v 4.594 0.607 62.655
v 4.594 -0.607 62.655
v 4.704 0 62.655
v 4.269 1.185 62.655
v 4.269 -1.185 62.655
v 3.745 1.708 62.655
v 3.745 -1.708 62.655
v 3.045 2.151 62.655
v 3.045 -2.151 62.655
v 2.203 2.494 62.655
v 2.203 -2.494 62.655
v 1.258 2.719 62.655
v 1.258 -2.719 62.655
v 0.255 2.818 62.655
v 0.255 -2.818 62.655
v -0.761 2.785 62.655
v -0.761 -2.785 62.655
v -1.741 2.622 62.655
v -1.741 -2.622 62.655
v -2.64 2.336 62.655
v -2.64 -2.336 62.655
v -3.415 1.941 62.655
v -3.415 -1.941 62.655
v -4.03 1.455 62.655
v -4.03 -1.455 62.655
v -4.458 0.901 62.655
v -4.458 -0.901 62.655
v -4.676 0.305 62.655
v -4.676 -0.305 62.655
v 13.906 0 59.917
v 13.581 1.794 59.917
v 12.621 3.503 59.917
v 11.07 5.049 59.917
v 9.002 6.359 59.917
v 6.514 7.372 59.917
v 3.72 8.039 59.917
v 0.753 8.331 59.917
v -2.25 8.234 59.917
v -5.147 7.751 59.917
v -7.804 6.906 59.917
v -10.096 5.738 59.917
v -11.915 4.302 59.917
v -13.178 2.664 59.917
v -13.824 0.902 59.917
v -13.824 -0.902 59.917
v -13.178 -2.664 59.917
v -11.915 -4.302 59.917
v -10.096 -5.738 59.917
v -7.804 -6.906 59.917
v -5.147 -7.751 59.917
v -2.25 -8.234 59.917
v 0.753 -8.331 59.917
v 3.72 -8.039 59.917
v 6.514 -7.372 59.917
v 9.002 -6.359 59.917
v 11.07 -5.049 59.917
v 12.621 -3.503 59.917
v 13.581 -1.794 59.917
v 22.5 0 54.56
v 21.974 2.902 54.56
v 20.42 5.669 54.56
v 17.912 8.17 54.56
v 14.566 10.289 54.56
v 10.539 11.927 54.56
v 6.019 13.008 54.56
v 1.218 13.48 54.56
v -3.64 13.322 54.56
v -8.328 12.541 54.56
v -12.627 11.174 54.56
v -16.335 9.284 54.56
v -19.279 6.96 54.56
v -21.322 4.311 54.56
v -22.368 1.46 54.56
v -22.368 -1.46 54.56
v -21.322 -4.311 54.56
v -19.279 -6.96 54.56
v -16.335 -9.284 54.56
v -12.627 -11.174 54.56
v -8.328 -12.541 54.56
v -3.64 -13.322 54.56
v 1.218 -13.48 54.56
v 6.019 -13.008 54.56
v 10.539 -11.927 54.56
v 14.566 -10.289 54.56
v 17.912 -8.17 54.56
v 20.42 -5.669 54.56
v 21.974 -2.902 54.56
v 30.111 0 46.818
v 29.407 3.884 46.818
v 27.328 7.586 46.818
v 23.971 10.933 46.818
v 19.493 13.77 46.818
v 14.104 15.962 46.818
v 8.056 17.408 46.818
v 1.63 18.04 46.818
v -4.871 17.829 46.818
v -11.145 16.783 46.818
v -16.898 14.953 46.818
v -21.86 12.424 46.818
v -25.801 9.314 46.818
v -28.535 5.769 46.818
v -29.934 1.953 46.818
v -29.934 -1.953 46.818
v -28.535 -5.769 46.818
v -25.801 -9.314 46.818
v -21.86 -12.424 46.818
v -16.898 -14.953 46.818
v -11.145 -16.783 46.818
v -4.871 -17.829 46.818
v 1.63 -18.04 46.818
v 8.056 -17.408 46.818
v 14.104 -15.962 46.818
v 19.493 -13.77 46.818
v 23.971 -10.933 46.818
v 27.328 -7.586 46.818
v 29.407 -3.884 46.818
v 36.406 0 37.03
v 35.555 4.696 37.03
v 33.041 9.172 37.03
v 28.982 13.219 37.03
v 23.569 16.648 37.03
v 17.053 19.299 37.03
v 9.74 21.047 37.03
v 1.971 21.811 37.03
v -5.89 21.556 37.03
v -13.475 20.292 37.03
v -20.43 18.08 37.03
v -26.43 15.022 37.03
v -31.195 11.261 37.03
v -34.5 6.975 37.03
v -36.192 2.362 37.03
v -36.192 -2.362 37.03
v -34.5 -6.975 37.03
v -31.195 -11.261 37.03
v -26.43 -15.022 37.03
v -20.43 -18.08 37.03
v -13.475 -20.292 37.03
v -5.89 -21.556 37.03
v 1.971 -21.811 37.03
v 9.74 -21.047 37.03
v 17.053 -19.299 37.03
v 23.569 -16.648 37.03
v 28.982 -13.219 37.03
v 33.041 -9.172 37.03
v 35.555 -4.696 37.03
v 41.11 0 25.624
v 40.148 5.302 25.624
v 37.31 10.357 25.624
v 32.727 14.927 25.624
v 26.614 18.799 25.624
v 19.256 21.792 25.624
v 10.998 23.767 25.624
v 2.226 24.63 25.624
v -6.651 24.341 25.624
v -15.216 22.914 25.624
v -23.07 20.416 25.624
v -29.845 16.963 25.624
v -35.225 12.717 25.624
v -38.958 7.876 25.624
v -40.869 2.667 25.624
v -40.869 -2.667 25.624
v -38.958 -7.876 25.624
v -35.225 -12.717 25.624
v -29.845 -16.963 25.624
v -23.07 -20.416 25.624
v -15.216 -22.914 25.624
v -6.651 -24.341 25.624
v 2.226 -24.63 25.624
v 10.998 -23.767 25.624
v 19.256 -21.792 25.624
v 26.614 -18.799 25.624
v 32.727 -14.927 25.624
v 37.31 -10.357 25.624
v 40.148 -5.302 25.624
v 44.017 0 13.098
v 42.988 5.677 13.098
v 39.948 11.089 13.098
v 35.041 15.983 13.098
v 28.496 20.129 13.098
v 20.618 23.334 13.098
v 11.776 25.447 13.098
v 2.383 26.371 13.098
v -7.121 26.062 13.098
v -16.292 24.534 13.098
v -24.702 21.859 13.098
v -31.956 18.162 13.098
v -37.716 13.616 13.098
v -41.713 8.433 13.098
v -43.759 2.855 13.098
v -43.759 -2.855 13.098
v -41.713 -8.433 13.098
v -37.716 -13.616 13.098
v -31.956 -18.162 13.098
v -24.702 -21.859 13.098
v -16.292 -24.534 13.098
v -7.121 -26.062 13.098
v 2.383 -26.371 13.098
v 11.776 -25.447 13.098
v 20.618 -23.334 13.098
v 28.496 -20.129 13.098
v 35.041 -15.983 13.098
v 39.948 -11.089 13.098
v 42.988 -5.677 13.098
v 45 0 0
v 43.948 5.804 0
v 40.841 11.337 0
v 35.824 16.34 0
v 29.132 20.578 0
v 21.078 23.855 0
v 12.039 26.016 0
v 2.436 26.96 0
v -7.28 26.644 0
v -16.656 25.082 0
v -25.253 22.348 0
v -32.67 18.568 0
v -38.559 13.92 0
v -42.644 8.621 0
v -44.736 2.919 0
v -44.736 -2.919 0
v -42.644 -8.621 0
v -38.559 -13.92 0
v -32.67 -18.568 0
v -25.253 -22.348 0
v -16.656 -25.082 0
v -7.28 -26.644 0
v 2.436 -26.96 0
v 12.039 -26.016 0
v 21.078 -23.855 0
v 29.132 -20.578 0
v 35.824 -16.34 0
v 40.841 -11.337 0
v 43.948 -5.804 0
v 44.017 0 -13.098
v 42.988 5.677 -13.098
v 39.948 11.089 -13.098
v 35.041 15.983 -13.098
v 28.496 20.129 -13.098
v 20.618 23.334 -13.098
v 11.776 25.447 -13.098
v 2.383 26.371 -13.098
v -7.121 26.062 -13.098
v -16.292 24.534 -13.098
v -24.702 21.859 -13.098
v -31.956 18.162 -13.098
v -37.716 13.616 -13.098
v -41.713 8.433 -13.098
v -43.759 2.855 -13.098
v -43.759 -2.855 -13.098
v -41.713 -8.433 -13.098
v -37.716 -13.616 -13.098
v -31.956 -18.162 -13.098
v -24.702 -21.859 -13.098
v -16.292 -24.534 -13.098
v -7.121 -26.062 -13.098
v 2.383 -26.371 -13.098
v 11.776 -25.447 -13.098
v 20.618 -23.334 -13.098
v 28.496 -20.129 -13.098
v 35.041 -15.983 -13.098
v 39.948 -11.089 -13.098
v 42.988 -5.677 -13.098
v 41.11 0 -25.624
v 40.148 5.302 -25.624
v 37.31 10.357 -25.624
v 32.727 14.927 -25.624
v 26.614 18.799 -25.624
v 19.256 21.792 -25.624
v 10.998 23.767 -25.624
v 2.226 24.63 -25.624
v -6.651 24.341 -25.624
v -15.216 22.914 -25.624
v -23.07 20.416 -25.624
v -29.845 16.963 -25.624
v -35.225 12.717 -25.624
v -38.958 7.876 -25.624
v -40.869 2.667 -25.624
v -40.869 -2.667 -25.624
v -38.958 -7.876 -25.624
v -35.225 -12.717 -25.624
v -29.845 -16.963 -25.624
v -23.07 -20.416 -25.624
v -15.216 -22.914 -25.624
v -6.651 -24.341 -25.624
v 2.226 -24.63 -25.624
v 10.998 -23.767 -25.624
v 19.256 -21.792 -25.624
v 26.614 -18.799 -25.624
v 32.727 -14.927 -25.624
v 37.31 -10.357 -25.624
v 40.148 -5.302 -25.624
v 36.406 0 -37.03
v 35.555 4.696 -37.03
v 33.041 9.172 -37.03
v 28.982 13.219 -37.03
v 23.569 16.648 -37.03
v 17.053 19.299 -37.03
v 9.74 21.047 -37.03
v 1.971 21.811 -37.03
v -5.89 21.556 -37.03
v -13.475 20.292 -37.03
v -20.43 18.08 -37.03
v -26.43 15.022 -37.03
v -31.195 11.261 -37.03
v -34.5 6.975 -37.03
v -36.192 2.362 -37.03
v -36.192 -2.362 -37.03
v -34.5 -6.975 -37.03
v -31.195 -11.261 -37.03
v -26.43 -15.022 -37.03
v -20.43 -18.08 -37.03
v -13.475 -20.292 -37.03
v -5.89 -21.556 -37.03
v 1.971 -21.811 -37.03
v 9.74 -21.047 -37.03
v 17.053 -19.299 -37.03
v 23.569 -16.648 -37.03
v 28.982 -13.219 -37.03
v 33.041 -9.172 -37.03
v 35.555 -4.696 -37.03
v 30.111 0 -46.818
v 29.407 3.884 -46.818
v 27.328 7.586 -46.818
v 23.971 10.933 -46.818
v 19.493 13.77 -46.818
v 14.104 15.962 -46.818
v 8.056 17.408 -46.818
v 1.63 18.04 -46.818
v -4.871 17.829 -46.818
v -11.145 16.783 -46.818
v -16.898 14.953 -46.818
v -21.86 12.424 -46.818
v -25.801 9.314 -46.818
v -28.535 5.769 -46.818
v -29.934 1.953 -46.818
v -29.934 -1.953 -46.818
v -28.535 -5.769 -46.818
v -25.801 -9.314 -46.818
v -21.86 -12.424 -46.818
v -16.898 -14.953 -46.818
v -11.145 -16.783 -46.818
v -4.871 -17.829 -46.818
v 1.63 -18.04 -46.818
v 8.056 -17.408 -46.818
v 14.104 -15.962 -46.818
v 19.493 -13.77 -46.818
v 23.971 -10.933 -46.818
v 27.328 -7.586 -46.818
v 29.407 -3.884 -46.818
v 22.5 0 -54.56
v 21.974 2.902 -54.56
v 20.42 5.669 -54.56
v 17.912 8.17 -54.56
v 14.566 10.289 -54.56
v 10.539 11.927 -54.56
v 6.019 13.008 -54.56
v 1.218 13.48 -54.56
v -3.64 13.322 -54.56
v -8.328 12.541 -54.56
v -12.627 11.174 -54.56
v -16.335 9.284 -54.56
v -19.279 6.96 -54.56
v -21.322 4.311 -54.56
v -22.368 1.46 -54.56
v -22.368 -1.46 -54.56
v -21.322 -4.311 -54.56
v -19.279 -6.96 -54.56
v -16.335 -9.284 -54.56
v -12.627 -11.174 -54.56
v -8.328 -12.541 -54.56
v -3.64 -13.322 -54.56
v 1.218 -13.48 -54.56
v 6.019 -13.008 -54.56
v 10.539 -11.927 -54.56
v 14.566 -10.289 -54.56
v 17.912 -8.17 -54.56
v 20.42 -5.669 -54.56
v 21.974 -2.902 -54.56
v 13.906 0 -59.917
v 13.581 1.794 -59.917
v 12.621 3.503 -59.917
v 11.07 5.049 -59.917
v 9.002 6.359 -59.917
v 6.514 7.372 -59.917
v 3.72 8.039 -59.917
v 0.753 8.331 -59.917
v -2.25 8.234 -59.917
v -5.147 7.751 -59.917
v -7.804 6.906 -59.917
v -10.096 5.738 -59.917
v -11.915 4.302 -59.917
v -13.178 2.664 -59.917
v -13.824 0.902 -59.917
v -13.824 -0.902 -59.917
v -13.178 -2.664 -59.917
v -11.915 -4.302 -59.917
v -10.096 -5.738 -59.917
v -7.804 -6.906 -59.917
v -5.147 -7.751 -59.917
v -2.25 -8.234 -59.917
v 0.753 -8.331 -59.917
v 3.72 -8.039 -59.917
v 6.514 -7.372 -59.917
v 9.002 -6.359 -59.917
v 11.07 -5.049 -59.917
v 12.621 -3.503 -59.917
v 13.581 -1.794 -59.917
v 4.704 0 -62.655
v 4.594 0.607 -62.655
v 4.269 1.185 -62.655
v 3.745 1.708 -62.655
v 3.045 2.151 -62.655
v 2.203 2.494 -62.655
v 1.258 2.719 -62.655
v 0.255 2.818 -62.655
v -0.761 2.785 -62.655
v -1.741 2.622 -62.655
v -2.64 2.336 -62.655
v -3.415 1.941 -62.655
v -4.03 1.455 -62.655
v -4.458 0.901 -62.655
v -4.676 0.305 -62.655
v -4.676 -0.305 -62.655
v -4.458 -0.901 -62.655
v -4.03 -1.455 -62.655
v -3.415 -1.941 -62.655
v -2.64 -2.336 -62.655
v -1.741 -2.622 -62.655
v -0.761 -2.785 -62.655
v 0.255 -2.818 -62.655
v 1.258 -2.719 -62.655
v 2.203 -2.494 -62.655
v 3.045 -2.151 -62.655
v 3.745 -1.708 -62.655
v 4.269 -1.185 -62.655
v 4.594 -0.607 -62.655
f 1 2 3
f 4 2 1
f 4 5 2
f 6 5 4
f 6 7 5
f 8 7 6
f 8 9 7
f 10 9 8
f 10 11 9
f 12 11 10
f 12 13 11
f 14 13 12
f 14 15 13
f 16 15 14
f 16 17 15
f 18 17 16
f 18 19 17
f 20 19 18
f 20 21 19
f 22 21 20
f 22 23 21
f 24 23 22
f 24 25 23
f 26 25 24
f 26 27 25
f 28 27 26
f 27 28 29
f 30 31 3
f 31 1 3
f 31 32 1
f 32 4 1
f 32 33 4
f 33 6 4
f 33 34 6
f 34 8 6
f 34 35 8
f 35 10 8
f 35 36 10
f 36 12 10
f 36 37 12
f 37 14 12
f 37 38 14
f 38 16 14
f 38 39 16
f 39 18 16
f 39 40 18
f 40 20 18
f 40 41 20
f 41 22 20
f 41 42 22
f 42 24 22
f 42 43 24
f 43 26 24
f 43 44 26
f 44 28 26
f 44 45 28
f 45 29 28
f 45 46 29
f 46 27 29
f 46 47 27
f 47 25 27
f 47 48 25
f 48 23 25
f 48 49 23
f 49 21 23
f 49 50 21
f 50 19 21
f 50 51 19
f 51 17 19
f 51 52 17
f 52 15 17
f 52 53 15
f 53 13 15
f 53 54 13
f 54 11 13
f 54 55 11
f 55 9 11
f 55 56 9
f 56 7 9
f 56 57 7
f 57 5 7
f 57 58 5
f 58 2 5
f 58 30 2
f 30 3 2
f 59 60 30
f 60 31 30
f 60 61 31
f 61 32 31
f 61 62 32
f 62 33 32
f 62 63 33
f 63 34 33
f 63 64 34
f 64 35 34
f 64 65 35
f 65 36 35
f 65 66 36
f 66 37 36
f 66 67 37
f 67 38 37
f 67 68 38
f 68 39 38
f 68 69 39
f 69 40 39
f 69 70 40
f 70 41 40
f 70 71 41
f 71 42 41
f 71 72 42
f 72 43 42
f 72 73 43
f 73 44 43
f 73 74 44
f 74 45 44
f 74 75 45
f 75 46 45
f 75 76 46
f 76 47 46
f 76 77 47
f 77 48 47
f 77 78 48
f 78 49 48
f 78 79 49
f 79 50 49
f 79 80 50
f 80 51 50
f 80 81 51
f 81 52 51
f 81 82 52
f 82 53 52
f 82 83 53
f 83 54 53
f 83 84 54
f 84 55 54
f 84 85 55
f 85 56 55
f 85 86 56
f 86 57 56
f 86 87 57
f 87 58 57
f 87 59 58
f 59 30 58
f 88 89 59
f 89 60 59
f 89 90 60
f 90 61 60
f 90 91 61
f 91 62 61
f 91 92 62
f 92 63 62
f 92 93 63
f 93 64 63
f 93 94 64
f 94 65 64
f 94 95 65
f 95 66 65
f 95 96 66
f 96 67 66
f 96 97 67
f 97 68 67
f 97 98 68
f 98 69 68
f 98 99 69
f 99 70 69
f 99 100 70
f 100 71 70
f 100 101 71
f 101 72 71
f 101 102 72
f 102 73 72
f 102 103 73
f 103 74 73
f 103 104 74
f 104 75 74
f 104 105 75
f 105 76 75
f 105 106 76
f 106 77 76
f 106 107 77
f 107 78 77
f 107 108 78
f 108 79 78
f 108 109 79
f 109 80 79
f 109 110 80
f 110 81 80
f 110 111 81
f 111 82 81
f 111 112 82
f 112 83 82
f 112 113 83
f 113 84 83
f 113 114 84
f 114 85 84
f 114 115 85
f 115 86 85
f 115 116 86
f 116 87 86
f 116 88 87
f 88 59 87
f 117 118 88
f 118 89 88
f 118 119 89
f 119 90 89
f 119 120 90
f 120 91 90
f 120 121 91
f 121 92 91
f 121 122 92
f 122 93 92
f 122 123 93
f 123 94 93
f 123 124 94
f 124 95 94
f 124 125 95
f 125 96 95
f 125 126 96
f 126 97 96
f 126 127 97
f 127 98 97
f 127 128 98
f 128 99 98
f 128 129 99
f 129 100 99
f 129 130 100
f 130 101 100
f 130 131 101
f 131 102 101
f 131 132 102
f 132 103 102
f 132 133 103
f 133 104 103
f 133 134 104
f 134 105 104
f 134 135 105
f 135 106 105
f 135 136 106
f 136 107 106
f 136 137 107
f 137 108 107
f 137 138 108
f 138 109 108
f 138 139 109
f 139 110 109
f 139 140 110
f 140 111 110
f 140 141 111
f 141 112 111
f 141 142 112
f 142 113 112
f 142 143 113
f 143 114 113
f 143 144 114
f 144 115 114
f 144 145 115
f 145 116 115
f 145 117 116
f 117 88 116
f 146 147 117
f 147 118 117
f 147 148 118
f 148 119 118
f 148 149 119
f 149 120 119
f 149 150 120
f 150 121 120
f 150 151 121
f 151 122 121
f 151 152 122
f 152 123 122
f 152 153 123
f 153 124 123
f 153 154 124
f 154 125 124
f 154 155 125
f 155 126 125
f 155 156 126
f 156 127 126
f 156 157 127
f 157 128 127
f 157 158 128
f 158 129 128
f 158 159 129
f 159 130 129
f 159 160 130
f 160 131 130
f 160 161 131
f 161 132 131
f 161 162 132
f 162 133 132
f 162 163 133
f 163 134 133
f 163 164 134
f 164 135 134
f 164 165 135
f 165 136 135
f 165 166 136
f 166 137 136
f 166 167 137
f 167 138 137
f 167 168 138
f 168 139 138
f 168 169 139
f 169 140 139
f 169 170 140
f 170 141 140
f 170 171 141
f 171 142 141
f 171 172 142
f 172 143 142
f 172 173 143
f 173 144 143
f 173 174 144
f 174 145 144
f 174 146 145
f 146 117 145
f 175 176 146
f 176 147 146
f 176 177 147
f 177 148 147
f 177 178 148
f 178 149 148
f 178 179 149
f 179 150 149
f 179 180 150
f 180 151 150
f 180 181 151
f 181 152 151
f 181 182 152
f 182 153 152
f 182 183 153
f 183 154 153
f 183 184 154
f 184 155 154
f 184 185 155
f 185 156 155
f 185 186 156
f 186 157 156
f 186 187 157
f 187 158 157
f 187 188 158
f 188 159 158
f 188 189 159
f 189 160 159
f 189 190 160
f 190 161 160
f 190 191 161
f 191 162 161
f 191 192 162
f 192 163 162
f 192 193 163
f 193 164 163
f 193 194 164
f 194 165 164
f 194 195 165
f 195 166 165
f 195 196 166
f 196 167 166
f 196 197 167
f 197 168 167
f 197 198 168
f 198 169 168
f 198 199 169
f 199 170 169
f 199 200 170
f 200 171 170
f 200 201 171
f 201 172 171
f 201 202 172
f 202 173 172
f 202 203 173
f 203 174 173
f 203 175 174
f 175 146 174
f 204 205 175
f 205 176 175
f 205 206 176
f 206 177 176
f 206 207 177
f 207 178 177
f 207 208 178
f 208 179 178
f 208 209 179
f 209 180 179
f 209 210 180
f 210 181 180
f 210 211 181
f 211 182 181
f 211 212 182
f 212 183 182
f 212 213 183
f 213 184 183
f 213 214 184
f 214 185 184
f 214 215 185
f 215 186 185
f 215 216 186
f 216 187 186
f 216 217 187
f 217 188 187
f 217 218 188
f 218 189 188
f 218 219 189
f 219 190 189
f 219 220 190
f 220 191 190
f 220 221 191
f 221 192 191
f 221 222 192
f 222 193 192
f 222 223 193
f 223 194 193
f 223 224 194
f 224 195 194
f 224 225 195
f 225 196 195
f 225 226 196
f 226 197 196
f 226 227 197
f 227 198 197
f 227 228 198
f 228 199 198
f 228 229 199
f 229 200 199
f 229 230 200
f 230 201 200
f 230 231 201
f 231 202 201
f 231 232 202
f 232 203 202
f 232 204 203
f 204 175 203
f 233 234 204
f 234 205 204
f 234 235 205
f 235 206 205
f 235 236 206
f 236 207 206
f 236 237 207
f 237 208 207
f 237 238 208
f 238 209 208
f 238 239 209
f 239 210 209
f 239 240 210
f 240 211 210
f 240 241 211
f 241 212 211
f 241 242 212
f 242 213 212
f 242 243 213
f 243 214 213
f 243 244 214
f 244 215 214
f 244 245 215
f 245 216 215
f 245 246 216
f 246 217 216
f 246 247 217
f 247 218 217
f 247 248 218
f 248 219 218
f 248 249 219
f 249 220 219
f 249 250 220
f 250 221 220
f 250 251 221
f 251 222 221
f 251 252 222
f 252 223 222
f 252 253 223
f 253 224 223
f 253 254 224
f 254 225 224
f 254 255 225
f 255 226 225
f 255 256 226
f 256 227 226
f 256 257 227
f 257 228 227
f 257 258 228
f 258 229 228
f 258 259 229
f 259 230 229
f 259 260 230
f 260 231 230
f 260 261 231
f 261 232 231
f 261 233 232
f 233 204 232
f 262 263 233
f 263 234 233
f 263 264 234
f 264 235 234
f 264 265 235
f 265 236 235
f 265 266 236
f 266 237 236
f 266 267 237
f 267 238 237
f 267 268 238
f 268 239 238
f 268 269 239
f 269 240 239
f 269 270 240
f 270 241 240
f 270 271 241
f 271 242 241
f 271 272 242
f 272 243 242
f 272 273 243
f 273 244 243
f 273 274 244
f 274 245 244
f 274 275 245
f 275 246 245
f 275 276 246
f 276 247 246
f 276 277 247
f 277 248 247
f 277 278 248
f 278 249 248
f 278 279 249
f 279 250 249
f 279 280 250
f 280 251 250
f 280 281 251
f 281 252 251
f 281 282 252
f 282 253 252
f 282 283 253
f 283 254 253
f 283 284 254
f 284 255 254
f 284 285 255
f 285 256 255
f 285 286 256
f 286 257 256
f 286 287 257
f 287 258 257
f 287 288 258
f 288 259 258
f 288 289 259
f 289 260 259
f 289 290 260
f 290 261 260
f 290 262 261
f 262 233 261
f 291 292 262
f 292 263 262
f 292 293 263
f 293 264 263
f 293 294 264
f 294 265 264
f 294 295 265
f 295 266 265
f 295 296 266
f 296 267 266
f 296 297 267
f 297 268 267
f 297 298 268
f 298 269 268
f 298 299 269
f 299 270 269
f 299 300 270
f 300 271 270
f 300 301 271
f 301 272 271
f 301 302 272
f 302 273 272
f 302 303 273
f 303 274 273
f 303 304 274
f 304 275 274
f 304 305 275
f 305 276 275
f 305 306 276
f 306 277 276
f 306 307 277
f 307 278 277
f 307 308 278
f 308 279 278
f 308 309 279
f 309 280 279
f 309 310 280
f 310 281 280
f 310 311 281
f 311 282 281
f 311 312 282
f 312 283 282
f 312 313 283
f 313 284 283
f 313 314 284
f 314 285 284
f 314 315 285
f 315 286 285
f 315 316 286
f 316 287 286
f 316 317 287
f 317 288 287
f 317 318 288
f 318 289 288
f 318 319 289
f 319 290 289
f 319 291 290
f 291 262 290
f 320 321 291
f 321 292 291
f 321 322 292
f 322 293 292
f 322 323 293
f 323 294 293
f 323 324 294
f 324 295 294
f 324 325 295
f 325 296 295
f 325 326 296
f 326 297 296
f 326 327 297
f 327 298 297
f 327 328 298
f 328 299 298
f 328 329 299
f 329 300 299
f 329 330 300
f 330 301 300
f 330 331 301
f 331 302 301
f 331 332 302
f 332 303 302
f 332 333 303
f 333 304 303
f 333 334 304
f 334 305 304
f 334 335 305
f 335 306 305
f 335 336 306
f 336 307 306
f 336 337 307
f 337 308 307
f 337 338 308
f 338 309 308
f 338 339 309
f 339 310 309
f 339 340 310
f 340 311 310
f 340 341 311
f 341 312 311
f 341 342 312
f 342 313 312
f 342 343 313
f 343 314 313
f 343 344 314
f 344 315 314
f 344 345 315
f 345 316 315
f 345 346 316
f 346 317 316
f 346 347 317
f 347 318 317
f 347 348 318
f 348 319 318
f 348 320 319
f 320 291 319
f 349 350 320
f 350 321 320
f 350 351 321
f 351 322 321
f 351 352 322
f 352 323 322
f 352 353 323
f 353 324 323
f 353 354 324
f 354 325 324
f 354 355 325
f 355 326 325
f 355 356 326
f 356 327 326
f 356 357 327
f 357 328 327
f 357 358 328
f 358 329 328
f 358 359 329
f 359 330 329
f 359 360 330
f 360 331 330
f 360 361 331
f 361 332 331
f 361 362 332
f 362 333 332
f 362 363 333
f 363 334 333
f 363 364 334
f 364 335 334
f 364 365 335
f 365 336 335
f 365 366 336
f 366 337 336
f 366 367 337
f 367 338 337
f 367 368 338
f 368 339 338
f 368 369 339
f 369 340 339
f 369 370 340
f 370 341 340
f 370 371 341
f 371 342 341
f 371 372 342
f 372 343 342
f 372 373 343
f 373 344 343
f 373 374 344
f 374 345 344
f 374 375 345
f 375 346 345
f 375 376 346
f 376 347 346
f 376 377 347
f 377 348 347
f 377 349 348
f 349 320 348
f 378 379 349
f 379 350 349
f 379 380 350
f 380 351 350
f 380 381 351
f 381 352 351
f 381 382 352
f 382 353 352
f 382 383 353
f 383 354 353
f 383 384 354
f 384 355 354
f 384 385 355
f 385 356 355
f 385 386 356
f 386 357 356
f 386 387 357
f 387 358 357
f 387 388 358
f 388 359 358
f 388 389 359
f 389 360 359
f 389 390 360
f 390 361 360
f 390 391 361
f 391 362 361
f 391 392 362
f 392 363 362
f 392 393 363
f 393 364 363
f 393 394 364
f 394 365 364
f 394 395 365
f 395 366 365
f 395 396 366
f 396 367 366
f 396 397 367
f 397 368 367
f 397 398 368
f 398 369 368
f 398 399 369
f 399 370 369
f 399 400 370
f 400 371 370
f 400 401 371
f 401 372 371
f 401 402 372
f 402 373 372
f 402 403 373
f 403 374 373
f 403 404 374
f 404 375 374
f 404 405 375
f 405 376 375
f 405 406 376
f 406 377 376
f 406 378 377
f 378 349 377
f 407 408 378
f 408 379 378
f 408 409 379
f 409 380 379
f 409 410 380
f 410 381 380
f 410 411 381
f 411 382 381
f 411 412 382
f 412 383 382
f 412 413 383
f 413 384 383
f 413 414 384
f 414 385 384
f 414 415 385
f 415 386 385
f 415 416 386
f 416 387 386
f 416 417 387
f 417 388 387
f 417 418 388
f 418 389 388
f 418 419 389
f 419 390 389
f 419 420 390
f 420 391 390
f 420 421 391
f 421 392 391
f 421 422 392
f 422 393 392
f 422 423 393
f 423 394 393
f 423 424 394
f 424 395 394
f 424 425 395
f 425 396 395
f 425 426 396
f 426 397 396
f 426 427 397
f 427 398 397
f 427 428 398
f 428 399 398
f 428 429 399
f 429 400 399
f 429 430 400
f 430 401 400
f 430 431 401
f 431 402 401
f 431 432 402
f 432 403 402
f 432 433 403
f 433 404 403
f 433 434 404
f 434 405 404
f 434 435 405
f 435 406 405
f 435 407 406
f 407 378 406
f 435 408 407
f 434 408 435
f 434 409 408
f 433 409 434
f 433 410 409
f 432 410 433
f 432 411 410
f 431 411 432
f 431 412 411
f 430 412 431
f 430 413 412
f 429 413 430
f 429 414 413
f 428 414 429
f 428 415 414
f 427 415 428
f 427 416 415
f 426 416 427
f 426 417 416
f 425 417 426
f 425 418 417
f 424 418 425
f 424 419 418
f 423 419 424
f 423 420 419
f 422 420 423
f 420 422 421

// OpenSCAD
// Generated by SolidPython 1.0.1 on 2020-07-29 00:46:46


scale(v = [5, 3, 7]) {
	sphere(r = 9);
}
/***********************************************
*********      SolidPython code:      **********
************************************************
 
# import packages: SolidPython
from solid import *
from solid.utils import *
from itertools import chain, combinations, permutations


class Resize:

    def __init__(self, scad_file):
        self.scad_file = scad_file
        #self.scad_file = import_scad(scad_file)
        # cone/cylinder param:
        self.r1 = 0
        self.r2 = 0
        self.h = 0
        # rectangular prism param:
        self.w = 0
        self.l = 0
        # ellipse param:
        self.r = 0

    # import OpenScad code (file name corresponds to shape)


    # classify shape + parameters
    def assign(self, param1, param2, param3):
        if self.scad_file == 'cone.scad':
            self.r1 = param1
            self.r2 = param2
            self.h = param3
        elif self.scad_file == 'cylinder.scad':
            self.r1 = param1
            self.r2 = param2
            self.h = param3
        elif self.scad_file == 'rectangularPrism.scad':
            self.h = param1
            self.l = param2
            self.w = param3
        else:
            self.r = param1
            self.h = param2

    # resize parameters
    def iterate(self):
        x = range(3, 20, 2)
        i = 1
        if self.scad_file == 'cone.scad':
            tempList = list(permutations(x, 2))
            for temp in tempList:
                param1 = temp[0]
                param2 = temp[1]
                filepath = 'produced_scad_files/' + 'cone' + str(param1) + '_' + str(param2) + '_' + '.scad'
                scad_render_to_file(cylinder(h=param1, r1=param2, r2=0), filepath)

        elif self.scad_file == 'cylinder.scad':
            tempList = list(permutations(x, 3))
            for temp in tempList:
                param1 = temp[0]
                param2 = temp[1]
                filepath = 'produced_scad_files/' + 'cylinder' + str(param1) + '_' + str(param2) + '_' + '.scad'
                scad_render_to_file(cylinder(h=param1, r1=param2, r2=param2), filepath)

        elif self.scad_file == 'rectangularPrism.scad':
            tempList = list(permutations(x, 3))
            for temp in tempList:
                param1 = temp[0]
                param2 = temp[1]
                param3 = temp[2]
                filepath = 'produced_scad_files/' + 'rectangularPrism' + str(param1) + '_' + str(param2) + '_' + str(
                    param3) + '.scad'
                scad_render_to_file(cube(size=(param1, param2, param3)), filepath)

        elif self.scad_file == 'ellipse.scad':
            tempList = list(permutations(x, 4))
            for temp in tempList:
                param1 = temp[0]
                param2 = temp[1]
                param3 = temp[2]
                param4 = temp[3]
                filepath = 'produced_scad_files/' + 'ellipse' + str(param1) + '_' + str(param2) + '_' + str(param3) + '_' + str(param4) + '.scad'
                scad_render_to_file(scale([param1, param2, param3])(sphere(r=param4)), filepath)

    def render_to_scadfile(self):
        scad_render_to_file(scad, 'example.scad') 
 
************************************************/
